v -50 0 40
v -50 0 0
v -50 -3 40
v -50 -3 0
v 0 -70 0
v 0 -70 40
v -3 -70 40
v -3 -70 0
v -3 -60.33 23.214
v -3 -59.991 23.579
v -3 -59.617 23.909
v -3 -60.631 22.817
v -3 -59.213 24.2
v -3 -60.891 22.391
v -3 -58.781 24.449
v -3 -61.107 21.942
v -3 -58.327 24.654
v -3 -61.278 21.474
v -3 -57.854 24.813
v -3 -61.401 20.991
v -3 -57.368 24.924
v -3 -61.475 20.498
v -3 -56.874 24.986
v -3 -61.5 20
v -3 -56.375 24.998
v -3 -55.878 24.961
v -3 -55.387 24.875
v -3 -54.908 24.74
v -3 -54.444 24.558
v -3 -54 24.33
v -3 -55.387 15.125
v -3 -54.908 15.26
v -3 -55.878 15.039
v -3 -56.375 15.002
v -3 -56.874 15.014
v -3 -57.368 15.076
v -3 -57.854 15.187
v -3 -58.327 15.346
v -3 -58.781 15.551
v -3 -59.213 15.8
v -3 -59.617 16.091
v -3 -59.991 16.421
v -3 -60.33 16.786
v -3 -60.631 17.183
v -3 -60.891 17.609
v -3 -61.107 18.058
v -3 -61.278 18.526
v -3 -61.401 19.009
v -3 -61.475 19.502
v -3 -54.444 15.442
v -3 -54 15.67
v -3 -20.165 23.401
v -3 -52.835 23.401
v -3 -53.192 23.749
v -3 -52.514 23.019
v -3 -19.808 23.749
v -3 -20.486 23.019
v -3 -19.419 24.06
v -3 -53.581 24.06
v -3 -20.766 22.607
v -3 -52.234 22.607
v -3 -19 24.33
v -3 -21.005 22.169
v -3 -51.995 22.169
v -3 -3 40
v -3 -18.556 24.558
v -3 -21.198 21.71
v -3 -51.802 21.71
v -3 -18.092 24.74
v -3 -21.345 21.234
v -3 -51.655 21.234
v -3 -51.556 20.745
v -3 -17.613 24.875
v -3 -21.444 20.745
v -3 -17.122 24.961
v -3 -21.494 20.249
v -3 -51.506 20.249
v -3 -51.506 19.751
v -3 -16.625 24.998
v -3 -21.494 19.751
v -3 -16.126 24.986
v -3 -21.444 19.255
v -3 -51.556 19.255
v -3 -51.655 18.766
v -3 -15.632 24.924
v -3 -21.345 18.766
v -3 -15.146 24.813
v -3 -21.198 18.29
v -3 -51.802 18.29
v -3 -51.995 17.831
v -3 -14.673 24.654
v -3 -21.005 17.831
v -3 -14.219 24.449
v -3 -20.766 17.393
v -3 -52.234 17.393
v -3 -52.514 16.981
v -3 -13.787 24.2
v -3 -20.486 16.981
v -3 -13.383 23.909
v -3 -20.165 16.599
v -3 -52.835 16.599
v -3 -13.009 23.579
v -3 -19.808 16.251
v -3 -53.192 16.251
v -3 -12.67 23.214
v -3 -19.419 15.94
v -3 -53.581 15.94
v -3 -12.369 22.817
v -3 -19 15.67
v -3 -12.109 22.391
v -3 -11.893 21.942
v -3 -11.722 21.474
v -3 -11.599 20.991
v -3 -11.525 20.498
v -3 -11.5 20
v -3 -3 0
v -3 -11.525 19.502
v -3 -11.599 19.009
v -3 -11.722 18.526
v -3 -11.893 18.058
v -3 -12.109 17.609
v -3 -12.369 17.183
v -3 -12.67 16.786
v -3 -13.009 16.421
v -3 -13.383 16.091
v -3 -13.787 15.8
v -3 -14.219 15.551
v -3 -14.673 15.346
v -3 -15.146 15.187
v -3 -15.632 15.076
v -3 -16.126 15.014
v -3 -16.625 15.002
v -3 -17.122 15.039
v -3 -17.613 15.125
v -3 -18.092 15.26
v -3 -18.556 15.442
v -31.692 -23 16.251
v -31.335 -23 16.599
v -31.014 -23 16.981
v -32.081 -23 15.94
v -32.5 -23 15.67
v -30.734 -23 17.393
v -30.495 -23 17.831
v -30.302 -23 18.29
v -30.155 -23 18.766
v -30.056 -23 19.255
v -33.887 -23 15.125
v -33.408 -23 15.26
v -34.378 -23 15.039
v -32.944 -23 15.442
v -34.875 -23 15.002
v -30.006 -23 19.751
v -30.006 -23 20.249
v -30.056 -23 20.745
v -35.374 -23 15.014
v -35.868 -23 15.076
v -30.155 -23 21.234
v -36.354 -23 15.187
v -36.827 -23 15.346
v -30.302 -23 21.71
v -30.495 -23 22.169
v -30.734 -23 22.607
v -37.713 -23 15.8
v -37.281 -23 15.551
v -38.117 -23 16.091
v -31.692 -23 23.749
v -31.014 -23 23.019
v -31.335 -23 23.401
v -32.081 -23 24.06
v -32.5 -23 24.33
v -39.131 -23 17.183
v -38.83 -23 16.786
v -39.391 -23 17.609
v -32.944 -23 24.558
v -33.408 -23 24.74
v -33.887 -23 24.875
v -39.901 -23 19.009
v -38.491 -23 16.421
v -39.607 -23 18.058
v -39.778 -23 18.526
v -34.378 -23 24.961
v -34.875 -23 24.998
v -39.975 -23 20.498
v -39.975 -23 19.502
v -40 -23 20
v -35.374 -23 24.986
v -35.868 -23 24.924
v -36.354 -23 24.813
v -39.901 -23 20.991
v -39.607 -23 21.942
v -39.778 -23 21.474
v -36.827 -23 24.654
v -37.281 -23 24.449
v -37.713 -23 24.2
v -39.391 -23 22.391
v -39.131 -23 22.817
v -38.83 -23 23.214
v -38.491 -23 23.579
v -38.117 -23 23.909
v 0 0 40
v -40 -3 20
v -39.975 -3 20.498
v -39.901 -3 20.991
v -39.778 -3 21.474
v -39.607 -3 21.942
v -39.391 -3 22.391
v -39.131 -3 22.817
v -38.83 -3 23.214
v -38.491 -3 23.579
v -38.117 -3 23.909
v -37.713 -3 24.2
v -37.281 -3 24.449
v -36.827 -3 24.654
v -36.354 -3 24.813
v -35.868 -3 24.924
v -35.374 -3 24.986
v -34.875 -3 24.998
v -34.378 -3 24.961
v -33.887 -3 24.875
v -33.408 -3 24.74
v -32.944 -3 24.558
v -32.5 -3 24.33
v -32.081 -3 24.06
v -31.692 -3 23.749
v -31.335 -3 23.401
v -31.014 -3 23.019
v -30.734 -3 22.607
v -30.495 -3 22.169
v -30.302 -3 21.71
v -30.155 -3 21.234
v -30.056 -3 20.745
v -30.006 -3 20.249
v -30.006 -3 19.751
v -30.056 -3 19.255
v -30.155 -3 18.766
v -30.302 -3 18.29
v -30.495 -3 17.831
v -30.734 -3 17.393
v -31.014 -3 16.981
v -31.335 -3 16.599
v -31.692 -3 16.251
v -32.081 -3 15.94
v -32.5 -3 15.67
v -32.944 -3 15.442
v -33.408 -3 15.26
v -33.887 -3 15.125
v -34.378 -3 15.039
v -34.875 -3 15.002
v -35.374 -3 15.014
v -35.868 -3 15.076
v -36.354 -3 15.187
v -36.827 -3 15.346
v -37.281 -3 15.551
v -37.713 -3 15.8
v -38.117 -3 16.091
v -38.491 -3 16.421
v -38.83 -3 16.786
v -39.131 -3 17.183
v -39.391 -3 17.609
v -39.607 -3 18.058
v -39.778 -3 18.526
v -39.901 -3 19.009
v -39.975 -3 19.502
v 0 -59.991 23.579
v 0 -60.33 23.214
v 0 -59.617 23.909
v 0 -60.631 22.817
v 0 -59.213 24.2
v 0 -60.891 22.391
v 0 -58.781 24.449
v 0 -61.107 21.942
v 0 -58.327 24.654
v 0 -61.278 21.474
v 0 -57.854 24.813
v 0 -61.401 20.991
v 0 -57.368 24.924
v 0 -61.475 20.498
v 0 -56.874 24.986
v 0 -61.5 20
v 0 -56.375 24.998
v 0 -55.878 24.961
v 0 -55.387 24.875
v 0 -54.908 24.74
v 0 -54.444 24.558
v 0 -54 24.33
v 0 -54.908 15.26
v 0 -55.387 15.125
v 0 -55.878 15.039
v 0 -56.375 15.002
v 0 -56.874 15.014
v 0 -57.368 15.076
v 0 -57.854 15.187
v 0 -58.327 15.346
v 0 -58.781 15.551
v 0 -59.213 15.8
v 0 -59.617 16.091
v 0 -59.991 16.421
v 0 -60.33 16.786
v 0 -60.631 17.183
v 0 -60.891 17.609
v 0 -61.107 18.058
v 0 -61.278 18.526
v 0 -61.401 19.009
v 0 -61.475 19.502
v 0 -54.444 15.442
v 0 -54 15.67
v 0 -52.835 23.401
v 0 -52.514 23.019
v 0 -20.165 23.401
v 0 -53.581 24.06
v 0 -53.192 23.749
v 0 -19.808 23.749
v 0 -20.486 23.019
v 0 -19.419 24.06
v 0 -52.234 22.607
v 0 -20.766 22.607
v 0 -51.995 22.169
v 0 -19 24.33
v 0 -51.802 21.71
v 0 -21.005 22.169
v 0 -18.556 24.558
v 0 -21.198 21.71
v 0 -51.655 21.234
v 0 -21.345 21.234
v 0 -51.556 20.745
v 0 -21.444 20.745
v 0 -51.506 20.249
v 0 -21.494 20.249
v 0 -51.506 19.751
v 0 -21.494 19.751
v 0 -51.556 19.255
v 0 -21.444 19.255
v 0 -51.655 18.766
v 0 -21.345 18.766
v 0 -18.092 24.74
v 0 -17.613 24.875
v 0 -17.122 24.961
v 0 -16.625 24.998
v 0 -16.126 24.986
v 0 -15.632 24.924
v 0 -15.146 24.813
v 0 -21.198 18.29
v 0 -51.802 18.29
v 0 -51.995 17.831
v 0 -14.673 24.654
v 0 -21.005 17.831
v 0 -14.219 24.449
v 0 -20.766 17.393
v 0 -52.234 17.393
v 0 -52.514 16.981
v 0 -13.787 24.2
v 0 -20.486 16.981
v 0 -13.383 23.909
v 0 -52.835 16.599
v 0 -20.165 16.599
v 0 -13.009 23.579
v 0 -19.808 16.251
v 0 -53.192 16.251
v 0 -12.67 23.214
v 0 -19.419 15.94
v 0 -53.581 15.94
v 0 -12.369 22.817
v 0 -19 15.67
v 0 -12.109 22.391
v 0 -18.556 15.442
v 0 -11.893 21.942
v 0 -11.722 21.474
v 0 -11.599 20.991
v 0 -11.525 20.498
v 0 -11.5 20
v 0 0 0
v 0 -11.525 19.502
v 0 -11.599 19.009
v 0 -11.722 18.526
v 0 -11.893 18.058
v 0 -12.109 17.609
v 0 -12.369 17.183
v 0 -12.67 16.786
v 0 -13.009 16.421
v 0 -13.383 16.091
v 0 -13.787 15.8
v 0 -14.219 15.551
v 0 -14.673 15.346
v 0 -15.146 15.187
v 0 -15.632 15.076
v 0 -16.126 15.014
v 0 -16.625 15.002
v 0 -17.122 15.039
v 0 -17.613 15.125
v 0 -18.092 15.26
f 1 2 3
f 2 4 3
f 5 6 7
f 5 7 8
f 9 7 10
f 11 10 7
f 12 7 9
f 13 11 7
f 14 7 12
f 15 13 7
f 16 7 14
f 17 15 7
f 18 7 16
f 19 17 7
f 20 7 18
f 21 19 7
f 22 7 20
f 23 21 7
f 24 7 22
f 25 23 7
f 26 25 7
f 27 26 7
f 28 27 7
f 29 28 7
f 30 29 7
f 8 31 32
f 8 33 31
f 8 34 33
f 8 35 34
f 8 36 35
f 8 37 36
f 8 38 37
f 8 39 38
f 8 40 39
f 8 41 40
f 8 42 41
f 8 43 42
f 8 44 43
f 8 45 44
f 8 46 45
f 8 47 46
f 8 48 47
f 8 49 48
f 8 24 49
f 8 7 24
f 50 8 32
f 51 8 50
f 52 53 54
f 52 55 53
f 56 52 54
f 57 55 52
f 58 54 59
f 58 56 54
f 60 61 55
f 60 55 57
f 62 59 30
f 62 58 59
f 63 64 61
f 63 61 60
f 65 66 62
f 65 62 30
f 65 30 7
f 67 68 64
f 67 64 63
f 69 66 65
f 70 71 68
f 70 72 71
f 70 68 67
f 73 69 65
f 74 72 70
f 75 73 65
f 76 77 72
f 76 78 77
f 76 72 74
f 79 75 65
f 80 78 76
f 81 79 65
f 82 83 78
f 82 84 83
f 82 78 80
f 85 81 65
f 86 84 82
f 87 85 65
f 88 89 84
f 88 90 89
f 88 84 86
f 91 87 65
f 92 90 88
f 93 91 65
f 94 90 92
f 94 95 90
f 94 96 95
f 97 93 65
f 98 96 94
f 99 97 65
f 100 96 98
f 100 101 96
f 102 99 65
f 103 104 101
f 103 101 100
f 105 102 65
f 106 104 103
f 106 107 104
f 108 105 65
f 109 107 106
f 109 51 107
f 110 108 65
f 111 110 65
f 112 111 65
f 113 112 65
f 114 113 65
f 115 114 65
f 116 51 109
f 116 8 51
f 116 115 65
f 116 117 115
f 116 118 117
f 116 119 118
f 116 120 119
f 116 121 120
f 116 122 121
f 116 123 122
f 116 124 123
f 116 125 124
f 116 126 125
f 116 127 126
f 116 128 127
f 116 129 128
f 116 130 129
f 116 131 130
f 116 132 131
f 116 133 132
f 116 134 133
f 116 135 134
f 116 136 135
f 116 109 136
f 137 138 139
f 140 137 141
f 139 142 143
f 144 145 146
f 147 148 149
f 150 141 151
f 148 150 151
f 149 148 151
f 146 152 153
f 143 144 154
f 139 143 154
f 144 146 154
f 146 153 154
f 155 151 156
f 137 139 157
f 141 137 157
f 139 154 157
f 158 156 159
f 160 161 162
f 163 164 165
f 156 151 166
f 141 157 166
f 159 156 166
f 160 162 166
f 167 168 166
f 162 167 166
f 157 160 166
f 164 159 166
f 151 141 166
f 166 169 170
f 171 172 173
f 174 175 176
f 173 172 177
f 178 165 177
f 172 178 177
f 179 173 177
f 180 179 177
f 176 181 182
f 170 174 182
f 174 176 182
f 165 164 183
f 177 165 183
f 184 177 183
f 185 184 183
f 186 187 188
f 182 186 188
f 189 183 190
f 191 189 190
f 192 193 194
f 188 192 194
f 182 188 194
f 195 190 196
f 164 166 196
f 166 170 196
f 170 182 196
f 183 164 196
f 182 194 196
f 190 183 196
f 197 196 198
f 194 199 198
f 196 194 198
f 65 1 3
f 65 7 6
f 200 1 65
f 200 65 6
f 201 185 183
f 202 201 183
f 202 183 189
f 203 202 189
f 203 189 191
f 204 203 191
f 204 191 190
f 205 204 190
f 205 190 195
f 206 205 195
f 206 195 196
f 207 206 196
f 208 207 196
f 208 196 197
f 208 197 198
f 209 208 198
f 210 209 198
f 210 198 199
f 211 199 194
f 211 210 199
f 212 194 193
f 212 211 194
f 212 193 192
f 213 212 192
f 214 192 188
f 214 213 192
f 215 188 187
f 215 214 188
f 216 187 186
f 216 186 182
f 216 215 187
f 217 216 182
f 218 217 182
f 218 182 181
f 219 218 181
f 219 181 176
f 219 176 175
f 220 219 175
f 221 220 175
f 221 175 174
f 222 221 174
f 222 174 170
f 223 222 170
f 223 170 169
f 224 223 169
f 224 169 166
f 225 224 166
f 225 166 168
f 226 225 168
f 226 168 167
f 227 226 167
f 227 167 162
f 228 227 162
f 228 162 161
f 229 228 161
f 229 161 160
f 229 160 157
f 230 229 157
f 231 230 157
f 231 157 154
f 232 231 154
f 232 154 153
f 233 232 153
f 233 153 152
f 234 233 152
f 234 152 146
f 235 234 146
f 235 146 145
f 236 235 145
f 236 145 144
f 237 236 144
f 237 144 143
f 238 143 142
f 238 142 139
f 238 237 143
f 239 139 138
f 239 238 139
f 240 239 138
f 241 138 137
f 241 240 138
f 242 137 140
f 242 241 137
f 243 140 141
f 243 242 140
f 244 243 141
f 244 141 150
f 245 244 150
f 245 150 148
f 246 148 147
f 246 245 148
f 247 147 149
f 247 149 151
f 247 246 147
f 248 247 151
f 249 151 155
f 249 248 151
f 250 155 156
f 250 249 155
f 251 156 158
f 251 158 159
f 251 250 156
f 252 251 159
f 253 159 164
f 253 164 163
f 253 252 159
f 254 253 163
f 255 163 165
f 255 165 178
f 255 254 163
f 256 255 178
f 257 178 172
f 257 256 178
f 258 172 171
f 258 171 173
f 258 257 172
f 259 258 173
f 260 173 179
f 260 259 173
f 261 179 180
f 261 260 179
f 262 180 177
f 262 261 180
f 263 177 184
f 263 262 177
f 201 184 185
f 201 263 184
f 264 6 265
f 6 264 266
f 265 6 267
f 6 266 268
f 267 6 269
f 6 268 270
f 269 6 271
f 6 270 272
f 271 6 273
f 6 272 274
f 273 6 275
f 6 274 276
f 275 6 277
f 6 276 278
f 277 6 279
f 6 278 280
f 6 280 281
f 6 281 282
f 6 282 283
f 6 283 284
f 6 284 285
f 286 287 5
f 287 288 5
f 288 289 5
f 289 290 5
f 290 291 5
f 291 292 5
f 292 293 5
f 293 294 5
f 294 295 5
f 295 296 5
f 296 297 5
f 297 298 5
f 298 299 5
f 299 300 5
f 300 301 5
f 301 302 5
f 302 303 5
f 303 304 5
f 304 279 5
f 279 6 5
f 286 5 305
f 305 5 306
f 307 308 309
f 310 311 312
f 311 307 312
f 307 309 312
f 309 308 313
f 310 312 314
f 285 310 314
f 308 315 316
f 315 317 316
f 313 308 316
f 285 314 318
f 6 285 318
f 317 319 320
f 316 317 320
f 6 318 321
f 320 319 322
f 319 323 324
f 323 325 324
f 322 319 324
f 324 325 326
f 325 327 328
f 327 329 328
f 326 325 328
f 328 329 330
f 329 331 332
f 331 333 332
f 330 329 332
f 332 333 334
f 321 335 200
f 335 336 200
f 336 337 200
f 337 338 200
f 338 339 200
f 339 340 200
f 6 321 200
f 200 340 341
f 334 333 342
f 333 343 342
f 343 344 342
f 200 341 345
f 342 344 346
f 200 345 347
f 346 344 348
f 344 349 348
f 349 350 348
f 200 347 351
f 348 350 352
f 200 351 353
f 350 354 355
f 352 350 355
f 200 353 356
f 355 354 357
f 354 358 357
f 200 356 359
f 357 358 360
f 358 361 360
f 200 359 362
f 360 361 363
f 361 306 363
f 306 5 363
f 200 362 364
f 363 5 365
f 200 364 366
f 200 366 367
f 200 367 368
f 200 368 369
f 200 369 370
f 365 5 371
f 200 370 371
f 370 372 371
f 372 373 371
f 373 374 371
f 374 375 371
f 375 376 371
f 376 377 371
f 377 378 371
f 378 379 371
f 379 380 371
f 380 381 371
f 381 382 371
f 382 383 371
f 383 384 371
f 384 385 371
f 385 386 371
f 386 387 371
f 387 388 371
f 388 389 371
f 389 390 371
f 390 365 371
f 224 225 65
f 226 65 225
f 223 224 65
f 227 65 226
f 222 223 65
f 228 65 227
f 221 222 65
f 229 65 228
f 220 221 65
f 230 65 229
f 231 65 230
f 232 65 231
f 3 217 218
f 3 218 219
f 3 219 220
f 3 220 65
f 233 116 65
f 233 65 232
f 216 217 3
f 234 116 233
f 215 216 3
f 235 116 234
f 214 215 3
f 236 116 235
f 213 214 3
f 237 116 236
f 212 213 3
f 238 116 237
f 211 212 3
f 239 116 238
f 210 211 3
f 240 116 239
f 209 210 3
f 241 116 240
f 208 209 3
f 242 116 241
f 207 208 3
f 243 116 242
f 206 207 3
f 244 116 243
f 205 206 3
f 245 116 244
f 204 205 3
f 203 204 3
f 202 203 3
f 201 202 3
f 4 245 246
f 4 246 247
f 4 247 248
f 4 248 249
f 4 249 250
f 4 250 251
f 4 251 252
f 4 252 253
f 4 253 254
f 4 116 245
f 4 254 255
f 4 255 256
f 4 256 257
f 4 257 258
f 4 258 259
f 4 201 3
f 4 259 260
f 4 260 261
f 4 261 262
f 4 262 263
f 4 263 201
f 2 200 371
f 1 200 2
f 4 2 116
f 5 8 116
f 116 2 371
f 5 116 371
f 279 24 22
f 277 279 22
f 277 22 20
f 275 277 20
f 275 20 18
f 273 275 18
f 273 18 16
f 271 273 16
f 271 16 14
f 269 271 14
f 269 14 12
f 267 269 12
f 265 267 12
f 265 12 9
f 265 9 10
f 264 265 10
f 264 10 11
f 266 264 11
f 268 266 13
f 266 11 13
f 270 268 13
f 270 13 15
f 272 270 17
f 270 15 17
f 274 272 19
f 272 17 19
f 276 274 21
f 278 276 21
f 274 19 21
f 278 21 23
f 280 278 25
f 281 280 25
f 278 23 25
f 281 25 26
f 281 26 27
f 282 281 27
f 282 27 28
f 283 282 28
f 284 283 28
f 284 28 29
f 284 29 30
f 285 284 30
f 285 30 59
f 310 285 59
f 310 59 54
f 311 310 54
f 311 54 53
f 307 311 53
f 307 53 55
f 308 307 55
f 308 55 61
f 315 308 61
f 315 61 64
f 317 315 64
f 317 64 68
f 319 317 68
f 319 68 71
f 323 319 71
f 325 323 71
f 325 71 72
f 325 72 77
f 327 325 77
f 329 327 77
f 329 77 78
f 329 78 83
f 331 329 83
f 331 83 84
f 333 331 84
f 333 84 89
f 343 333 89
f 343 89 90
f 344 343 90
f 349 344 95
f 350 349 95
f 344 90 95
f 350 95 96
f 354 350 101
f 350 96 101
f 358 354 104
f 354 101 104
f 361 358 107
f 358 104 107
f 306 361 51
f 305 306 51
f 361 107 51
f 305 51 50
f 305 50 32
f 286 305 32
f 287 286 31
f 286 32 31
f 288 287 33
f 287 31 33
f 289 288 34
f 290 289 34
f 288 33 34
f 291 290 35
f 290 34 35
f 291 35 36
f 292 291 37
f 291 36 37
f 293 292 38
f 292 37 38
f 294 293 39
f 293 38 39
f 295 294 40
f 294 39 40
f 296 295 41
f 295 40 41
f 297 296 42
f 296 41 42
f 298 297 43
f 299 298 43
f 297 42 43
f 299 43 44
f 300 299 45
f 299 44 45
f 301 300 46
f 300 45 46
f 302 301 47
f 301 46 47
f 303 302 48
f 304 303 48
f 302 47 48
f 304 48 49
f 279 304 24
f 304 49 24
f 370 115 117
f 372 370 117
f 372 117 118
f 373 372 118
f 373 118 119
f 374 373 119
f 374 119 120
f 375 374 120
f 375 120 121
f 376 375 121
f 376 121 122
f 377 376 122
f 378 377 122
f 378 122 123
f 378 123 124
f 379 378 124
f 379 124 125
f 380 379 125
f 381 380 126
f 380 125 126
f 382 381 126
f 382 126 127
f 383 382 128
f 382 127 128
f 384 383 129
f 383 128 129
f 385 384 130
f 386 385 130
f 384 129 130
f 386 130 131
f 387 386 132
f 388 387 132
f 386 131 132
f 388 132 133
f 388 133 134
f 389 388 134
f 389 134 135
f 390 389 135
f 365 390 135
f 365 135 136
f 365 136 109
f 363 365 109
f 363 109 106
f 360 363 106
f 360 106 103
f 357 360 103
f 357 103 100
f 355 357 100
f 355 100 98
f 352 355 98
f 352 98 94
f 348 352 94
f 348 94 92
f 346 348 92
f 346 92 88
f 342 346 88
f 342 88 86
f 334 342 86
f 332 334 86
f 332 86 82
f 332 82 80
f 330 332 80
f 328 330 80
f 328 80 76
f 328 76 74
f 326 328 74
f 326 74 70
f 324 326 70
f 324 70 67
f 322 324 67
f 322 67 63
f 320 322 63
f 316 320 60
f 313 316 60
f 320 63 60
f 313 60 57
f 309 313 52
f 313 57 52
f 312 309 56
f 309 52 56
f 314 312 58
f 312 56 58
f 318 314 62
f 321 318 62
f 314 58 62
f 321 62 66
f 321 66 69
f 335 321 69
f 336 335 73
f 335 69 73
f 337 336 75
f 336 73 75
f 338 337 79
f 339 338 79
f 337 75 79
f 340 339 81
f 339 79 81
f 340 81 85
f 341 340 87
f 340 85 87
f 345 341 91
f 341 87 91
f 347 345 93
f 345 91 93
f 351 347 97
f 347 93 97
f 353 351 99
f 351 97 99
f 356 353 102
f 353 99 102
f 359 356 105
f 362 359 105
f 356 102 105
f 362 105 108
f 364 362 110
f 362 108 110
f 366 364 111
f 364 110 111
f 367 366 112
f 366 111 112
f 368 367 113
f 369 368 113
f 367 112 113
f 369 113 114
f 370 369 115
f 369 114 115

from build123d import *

# Parameters (mm, degrees)
SUPERFICIE_EXTRUIR1_1_DEPTH = 40
DAR_ESPESOR1_T1             = 3
CROQUIS2_R                  = 5
EXTRUIR1_DEPTH              = 23
CROQUIS3_R                  = 5
EXTRUIR2_DEPTH              = 20


with BuildPart() as body_1:
    # Superficie-Extruir1: a surface, the sketch's curves swept straight by 40 mm
    with BuildLine(Plane.XY, mode=Mode.PRIVATE) as superficie_extruir1_1_path:
        Line((0, -70), (0, 0))
        Line((0, 0), (-50, 0))
    superficie_extruir1_1 = Shell.extrude(superficie_extruir1_1_path.wire(), (0 * SUPERFICIE_EXTRUIR1_1_DEPTH, 0 * SUPERFICIE_EXTRUIR1_1_DEPTH, 1 * SUPERFICIE_EXTRUIR1_1_DEPTH))
    add(Solid.thicken(superficie_extruir1_1, DAR_ESPESOR1_T1))

    # Croquis2 → Extruir1 (add)
    with BuildSketch(Plane(origin=(0, 0, 0), x_dir=(1, 0, 0), z_dir=(0, 1, 0))):
        with Locations(Location((-35, -20, 0), (0, 0, 180))):
            Circle(CROQUIS2_R)
    extrude(amount=-EXTRUIR1_DEPTH)

    # Croquis3 → Extruir2 (cut)
    with BuildSketch(Plane.ZY.offset(3)):
        with Locations(Location((20, -56.5, 0), (0, 0, 270))):
            Circle(CROQUIS3_R)
        with Locations(Location((20, -16.5, 0), (0, 0, 90))):
            Circle(CROQUIS3_R)
    extrude(amount=-EXTRUIR2_DEPTH, mode=Mode.SUBTRACT)


solid = body_1.part
